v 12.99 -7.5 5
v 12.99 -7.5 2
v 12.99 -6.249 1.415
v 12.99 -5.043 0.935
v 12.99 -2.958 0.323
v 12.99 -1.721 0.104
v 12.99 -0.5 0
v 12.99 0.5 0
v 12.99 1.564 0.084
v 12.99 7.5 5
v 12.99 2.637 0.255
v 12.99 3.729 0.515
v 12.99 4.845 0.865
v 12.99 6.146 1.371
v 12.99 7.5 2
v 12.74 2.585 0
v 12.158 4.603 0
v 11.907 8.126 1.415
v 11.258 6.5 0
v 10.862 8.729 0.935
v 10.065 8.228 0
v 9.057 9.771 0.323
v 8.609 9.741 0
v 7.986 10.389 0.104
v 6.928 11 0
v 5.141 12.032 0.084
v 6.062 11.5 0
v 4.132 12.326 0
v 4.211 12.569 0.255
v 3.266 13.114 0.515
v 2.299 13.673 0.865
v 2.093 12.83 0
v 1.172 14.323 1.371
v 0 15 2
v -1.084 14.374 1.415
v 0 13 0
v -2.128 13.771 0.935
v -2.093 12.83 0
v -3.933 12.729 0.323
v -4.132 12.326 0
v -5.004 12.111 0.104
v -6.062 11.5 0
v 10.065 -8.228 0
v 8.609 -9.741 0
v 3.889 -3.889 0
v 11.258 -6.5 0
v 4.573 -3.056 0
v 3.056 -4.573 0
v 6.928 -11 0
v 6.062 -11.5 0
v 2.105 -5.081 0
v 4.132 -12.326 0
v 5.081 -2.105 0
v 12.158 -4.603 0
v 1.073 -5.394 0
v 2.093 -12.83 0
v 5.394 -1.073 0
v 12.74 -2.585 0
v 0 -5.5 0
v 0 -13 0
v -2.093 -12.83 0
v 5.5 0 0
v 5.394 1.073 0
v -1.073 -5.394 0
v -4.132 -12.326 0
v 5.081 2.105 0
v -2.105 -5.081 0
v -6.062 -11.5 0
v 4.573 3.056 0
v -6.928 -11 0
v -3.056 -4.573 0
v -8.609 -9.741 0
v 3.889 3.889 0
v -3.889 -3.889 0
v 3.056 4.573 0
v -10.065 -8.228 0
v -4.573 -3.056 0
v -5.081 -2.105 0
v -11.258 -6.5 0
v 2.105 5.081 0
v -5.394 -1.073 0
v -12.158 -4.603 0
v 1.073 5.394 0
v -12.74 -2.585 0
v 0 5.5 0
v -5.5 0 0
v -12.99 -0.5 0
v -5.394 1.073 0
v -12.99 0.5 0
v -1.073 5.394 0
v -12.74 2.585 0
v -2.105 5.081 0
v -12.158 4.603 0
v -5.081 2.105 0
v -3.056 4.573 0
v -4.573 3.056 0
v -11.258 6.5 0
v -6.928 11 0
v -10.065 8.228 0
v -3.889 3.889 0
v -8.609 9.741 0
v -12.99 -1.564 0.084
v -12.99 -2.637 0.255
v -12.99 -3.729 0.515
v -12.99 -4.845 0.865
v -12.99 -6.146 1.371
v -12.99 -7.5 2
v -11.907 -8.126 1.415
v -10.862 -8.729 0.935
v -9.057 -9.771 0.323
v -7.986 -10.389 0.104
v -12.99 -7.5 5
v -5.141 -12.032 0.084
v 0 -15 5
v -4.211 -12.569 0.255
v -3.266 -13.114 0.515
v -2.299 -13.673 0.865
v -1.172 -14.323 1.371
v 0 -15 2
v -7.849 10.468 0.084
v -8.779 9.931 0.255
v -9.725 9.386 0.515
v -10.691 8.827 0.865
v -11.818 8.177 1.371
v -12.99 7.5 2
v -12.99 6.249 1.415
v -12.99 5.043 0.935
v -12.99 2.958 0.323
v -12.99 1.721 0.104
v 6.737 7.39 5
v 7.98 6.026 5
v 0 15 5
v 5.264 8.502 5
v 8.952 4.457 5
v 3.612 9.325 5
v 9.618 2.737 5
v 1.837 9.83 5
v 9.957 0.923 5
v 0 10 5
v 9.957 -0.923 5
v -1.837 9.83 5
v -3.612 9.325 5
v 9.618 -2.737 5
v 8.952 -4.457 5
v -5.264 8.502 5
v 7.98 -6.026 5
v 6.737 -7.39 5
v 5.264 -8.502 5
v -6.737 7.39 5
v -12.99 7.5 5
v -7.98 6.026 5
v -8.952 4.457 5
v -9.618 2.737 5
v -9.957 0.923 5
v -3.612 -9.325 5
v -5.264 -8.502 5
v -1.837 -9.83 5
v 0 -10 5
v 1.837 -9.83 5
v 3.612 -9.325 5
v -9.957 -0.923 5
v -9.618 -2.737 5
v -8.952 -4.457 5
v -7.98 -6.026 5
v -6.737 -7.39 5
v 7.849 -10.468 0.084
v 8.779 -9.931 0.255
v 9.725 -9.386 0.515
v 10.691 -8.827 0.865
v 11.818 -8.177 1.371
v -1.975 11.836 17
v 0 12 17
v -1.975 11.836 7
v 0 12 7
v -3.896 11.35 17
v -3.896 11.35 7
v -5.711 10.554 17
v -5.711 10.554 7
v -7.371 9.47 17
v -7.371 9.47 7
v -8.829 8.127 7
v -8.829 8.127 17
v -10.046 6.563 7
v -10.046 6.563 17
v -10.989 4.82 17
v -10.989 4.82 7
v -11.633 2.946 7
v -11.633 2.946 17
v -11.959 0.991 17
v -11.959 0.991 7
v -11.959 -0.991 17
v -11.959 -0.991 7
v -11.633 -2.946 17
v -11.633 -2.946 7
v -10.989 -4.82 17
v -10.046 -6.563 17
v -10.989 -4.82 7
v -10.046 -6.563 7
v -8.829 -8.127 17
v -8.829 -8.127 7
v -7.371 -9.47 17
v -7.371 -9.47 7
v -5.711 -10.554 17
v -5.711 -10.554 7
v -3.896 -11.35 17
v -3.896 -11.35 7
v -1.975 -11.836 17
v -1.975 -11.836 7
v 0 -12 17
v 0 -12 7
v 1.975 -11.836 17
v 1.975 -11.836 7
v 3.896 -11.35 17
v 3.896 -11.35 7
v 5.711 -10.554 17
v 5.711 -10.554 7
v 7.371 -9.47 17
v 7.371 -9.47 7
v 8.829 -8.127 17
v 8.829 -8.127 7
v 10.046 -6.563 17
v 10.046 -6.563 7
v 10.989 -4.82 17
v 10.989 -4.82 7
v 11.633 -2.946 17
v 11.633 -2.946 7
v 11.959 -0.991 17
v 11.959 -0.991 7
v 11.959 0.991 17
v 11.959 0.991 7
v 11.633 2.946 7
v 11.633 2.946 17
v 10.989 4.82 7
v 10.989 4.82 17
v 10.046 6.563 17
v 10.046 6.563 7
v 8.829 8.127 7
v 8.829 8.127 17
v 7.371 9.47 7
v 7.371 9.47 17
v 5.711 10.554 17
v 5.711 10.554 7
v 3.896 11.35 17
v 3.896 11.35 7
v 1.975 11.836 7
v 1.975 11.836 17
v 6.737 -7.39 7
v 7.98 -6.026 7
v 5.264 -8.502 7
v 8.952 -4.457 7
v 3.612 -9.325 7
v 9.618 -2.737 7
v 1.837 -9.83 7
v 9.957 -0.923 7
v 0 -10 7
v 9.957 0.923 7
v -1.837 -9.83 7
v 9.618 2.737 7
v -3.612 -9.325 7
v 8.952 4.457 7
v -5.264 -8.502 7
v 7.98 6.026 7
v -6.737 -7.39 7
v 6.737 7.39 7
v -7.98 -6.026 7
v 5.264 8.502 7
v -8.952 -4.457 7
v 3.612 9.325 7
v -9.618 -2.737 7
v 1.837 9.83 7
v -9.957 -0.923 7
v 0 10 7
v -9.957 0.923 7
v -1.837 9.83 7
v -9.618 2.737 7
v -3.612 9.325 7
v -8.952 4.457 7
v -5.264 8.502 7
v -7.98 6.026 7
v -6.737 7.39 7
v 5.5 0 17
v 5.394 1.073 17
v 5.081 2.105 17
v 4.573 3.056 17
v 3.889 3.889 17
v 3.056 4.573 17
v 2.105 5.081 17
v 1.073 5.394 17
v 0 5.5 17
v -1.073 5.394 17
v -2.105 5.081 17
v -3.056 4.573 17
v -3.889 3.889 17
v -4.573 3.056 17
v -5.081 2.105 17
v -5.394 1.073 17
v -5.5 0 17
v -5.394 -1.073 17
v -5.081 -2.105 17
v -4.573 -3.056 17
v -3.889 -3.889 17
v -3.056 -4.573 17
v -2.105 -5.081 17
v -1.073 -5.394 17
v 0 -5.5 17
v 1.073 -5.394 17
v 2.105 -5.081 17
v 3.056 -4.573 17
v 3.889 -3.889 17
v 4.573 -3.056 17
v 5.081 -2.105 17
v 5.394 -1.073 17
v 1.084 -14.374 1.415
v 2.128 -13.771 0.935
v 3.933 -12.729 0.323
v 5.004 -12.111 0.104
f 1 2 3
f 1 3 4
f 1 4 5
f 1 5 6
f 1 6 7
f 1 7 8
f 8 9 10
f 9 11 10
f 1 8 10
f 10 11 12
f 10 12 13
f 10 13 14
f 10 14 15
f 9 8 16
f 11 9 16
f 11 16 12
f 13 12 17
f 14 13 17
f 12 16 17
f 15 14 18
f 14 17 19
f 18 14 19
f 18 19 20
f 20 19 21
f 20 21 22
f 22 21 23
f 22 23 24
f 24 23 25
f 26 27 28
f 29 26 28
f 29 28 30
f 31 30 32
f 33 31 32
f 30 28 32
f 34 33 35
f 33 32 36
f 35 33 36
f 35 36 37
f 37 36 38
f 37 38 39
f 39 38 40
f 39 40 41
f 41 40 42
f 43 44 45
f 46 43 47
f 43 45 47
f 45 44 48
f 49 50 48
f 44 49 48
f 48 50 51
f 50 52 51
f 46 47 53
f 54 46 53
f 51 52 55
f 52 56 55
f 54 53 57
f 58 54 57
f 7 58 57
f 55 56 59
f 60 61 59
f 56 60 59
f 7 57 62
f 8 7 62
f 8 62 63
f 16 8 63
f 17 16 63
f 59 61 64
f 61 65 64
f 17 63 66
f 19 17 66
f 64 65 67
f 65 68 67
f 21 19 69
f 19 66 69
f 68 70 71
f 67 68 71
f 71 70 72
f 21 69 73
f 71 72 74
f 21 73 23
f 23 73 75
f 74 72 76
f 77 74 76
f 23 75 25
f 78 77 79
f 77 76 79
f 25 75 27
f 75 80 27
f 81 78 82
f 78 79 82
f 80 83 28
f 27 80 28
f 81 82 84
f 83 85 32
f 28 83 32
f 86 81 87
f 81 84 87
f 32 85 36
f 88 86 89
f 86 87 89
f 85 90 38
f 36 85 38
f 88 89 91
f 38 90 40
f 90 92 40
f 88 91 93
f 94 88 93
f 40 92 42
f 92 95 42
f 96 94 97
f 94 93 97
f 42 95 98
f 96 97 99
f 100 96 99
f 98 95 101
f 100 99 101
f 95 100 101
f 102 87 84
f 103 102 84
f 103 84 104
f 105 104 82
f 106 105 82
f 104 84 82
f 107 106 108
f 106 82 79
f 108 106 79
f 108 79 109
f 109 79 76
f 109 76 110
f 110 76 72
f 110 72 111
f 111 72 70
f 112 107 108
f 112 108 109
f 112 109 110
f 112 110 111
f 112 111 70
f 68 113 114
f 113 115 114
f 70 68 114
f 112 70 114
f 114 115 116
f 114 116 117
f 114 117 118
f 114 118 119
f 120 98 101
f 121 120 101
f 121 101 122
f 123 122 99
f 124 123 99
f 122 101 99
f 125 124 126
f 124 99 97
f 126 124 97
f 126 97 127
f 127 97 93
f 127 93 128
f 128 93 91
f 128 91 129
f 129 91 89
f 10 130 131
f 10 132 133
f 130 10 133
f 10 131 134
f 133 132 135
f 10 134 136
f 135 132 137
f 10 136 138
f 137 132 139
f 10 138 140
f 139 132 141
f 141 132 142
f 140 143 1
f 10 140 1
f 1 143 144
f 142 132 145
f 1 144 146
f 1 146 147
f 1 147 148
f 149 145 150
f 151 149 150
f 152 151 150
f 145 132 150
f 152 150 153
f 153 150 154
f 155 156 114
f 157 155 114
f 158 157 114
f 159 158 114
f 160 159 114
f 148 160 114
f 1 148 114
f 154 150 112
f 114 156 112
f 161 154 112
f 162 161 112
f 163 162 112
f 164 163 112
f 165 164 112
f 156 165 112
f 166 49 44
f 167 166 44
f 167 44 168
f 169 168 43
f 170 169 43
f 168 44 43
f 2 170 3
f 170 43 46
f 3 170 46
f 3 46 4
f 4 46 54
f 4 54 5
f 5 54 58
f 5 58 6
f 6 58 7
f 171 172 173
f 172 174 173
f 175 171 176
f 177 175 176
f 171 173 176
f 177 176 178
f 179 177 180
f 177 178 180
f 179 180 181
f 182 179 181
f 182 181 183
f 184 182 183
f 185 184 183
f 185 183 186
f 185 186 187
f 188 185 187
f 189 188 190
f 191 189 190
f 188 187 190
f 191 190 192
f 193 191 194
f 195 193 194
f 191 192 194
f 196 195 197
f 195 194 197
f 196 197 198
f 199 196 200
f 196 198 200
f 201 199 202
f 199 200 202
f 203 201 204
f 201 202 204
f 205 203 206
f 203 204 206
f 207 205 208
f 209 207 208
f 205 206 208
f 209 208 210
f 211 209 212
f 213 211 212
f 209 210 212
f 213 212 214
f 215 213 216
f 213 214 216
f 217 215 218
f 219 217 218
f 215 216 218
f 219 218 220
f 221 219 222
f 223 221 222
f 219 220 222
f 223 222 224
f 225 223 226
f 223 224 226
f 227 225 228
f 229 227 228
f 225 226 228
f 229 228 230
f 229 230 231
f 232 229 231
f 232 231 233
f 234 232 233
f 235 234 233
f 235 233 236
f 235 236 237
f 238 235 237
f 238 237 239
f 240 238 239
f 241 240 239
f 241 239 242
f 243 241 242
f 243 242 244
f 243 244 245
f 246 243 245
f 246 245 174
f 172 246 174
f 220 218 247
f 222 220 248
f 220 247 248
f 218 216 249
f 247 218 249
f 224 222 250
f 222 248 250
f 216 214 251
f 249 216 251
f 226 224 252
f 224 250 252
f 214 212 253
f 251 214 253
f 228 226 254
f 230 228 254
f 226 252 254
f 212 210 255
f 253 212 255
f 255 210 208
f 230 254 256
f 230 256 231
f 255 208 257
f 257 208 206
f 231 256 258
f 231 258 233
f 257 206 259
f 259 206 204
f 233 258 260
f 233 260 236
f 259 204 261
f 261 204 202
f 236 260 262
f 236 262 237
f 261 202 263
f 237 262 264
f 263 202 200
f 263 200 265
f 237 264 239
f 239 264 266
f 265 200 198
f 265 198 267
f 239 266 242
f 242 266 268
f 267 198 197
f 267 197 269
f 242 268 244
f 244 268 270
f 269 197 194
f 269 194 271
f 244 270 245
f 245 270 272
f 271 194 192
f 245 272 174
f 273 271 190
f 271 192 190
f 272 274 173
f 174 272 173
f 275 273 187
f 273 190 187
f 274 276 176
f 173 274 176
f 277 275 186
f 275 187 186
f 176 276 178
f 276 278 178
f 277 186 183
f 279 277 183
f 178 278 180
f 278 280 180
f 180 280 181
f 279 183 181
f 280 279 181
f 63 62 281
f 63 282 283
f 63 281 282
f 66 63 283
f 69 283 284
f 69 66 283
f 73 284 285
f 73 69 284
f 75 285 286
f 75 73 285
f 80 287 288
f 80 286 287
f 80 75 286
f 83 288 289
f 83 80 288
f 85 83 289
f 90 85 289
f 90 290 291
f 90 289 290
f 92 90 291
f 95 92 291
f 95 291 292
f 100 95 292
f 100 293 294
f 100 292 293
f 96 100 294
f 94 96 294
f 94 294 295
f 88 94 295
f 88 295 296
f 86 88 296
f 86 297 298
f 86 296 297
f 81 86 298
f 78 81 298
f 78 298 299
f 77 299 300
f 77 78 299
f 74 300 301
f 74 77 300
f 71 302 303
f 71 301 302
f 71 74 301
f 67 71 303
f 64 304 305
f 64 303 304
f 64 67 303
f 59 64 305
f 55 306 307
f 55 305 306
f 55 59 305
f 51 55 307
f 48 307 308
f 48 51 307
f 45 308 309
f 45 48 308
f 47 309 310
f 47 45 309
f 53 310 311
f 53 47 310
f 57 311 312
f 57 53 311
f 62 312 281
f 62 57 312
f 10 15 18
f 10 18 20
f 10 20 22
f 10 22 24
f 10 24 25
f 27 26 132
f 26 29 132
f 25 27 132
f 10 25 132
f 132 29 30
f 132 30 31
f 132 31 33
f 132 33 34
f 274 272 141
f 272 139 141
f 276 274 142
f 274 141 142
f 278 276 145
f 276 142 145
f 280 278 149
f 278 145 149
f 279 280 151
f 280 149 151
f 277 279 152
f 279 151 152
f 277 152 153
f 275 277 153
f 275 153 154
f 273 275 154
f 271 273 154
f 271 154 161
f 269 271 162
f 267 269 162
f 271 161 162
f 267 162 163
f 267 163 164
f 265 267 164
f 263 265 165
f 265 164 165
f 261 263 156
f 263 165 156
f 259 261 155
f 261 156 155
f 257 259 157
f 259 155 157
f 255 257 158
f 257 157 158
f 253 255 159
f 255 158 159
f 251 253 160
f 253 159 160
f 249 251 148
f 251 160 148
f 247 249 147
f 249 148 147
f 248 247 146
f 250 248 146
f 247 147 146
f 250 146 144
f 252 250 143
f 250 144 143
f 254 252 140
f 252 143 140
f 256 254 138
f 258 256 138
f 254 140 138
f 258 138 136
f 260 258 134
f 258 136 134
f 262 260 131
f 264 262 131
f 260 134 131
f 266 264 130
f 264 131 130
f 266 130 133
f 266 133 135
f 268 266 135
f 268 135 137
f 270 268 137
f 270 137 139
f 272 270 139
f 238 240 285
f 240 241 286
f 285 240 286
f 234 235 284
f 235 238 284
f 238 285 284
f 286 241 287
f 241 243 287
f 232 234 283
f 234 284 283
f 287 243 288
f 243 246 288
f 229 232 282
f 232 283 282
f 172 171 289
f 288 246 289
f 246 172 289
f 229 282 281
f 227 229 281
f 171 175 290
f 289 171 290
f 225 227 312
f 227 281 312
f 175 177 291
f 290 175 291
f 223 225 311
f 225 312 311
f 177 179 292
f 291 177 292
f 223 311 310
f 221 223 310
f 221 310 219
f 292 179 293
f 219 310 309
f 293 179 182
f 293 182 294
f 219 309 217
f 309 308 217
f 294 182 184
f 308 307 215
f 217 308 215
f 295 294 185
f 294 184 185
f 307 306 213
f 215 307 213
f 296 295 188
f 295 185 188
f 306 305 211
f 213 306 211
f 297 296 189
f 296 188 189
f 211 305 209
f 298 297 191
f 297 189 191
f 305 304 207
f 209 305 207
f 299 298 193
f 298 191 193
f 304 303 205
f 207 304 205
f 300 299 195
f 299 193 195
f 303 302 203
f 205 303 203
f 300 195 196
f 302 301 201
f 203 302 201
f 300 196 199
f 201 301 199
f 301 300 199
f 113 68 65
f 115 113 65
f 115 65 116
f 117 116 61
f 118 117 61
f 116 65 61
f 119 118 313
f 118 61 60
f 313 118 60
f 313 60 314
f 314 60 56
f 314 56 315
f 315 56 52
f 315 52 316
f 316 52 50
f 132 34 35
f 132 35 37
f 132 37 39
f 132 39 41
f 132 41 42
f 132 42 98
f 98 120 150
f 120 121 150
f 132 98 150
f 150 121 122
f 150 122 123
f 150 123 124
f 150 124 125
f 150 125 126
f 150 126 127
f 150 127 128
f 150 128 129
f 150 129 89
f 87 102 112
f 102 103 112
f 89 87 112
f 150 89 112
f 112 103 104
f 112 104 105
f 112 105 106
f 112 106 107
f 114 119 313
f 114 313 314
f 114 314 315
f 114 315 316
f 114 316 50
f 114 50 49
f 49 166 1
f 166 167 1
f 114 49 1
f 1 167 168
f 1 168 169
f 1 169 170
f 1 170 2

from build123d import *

# Parameters (mm, degrees)
CHAMFER_1_SIZE           = 2
CUT_EXTRUDE_1_DEPTH      = 28.184554438
CUT_EXTRUDE_1_DEPTH_BACK = 28.184554438
SKETCH_2_R               = 5.5
CUT_EXTRUDE_2_DEPTH      = 25.372115214
CUT_EXTRUDE_2_DEPTH_BACK = 25.372115214
SKETCH_3_OUTSIDE_W       = 41.142
SKETCH_3_OUTSIDE_H       = 41.142


with BuildPart() as part:
    # 草图1 → 旋转1 (revolve)
    with BuildSketch(Plane(origin=(0, 0, 0), x_dir=(0, 0, -1), z_dir=(1, 0, 0))):
        Polygon((-17, 0), (-17, 12), (-7, 12), (-7, 10), (-5, 10), (-5, 15), (0, 15), (0, 0), align=None)
    revolve(axis=Axis((0, 0, 0), (0, 0, 1)))

    # 倒角1
    chamfer_1_edges = [part.edges().sort_by_distance(p)[0] for p in [
        (0, -15, 0),
    ]]
    chamfer(chamfer_1_edges, length=CHAMFER_1_SIZE)

    # 草图2 → 切除-拉伸1 (cut, two sides: drawn at the far end of the back side and taken through both)
    with BuildSketch(Plane.XY.offset(17).offset(-CUT_EXTRUDE_1_DEPTH_BACK)):
        Circle(SKETCH_2_R)
    extrude(amount=CUT_EXTRUDE_1_DEPTH + CUT_EXTRUDE_1_DEPTH_BACK, mode=Mode.SUBTRACT)

    # 草图3 outside → 切除-拉伸2 (cut, two sides: drawn at the far end of the back side and taken through both)
    with BuildSketch(Plane.XY.offset(5).offset(-CUT_EXTRUDE_2_DEPTH_BACK)):
        Rectangle(SKETCH_3_OUTSIDE_W, SKETCH_3_OUTSIDE_H)
        Polygon((0, 15), (-12.990381057, 7.5), (-12.990381057, -7.5), (0, -15), (12.990381057, -7.5), (12.990381057, 7.5), align=None, mode=Mode.SUBTRACT)
    extrude(amount=CUT_EXTRUDE_2_DEPTH + CUT_EXTRUDE_2_DEPTH_BACK, mode=Mode.SUBTRACT)


solid = part.part
